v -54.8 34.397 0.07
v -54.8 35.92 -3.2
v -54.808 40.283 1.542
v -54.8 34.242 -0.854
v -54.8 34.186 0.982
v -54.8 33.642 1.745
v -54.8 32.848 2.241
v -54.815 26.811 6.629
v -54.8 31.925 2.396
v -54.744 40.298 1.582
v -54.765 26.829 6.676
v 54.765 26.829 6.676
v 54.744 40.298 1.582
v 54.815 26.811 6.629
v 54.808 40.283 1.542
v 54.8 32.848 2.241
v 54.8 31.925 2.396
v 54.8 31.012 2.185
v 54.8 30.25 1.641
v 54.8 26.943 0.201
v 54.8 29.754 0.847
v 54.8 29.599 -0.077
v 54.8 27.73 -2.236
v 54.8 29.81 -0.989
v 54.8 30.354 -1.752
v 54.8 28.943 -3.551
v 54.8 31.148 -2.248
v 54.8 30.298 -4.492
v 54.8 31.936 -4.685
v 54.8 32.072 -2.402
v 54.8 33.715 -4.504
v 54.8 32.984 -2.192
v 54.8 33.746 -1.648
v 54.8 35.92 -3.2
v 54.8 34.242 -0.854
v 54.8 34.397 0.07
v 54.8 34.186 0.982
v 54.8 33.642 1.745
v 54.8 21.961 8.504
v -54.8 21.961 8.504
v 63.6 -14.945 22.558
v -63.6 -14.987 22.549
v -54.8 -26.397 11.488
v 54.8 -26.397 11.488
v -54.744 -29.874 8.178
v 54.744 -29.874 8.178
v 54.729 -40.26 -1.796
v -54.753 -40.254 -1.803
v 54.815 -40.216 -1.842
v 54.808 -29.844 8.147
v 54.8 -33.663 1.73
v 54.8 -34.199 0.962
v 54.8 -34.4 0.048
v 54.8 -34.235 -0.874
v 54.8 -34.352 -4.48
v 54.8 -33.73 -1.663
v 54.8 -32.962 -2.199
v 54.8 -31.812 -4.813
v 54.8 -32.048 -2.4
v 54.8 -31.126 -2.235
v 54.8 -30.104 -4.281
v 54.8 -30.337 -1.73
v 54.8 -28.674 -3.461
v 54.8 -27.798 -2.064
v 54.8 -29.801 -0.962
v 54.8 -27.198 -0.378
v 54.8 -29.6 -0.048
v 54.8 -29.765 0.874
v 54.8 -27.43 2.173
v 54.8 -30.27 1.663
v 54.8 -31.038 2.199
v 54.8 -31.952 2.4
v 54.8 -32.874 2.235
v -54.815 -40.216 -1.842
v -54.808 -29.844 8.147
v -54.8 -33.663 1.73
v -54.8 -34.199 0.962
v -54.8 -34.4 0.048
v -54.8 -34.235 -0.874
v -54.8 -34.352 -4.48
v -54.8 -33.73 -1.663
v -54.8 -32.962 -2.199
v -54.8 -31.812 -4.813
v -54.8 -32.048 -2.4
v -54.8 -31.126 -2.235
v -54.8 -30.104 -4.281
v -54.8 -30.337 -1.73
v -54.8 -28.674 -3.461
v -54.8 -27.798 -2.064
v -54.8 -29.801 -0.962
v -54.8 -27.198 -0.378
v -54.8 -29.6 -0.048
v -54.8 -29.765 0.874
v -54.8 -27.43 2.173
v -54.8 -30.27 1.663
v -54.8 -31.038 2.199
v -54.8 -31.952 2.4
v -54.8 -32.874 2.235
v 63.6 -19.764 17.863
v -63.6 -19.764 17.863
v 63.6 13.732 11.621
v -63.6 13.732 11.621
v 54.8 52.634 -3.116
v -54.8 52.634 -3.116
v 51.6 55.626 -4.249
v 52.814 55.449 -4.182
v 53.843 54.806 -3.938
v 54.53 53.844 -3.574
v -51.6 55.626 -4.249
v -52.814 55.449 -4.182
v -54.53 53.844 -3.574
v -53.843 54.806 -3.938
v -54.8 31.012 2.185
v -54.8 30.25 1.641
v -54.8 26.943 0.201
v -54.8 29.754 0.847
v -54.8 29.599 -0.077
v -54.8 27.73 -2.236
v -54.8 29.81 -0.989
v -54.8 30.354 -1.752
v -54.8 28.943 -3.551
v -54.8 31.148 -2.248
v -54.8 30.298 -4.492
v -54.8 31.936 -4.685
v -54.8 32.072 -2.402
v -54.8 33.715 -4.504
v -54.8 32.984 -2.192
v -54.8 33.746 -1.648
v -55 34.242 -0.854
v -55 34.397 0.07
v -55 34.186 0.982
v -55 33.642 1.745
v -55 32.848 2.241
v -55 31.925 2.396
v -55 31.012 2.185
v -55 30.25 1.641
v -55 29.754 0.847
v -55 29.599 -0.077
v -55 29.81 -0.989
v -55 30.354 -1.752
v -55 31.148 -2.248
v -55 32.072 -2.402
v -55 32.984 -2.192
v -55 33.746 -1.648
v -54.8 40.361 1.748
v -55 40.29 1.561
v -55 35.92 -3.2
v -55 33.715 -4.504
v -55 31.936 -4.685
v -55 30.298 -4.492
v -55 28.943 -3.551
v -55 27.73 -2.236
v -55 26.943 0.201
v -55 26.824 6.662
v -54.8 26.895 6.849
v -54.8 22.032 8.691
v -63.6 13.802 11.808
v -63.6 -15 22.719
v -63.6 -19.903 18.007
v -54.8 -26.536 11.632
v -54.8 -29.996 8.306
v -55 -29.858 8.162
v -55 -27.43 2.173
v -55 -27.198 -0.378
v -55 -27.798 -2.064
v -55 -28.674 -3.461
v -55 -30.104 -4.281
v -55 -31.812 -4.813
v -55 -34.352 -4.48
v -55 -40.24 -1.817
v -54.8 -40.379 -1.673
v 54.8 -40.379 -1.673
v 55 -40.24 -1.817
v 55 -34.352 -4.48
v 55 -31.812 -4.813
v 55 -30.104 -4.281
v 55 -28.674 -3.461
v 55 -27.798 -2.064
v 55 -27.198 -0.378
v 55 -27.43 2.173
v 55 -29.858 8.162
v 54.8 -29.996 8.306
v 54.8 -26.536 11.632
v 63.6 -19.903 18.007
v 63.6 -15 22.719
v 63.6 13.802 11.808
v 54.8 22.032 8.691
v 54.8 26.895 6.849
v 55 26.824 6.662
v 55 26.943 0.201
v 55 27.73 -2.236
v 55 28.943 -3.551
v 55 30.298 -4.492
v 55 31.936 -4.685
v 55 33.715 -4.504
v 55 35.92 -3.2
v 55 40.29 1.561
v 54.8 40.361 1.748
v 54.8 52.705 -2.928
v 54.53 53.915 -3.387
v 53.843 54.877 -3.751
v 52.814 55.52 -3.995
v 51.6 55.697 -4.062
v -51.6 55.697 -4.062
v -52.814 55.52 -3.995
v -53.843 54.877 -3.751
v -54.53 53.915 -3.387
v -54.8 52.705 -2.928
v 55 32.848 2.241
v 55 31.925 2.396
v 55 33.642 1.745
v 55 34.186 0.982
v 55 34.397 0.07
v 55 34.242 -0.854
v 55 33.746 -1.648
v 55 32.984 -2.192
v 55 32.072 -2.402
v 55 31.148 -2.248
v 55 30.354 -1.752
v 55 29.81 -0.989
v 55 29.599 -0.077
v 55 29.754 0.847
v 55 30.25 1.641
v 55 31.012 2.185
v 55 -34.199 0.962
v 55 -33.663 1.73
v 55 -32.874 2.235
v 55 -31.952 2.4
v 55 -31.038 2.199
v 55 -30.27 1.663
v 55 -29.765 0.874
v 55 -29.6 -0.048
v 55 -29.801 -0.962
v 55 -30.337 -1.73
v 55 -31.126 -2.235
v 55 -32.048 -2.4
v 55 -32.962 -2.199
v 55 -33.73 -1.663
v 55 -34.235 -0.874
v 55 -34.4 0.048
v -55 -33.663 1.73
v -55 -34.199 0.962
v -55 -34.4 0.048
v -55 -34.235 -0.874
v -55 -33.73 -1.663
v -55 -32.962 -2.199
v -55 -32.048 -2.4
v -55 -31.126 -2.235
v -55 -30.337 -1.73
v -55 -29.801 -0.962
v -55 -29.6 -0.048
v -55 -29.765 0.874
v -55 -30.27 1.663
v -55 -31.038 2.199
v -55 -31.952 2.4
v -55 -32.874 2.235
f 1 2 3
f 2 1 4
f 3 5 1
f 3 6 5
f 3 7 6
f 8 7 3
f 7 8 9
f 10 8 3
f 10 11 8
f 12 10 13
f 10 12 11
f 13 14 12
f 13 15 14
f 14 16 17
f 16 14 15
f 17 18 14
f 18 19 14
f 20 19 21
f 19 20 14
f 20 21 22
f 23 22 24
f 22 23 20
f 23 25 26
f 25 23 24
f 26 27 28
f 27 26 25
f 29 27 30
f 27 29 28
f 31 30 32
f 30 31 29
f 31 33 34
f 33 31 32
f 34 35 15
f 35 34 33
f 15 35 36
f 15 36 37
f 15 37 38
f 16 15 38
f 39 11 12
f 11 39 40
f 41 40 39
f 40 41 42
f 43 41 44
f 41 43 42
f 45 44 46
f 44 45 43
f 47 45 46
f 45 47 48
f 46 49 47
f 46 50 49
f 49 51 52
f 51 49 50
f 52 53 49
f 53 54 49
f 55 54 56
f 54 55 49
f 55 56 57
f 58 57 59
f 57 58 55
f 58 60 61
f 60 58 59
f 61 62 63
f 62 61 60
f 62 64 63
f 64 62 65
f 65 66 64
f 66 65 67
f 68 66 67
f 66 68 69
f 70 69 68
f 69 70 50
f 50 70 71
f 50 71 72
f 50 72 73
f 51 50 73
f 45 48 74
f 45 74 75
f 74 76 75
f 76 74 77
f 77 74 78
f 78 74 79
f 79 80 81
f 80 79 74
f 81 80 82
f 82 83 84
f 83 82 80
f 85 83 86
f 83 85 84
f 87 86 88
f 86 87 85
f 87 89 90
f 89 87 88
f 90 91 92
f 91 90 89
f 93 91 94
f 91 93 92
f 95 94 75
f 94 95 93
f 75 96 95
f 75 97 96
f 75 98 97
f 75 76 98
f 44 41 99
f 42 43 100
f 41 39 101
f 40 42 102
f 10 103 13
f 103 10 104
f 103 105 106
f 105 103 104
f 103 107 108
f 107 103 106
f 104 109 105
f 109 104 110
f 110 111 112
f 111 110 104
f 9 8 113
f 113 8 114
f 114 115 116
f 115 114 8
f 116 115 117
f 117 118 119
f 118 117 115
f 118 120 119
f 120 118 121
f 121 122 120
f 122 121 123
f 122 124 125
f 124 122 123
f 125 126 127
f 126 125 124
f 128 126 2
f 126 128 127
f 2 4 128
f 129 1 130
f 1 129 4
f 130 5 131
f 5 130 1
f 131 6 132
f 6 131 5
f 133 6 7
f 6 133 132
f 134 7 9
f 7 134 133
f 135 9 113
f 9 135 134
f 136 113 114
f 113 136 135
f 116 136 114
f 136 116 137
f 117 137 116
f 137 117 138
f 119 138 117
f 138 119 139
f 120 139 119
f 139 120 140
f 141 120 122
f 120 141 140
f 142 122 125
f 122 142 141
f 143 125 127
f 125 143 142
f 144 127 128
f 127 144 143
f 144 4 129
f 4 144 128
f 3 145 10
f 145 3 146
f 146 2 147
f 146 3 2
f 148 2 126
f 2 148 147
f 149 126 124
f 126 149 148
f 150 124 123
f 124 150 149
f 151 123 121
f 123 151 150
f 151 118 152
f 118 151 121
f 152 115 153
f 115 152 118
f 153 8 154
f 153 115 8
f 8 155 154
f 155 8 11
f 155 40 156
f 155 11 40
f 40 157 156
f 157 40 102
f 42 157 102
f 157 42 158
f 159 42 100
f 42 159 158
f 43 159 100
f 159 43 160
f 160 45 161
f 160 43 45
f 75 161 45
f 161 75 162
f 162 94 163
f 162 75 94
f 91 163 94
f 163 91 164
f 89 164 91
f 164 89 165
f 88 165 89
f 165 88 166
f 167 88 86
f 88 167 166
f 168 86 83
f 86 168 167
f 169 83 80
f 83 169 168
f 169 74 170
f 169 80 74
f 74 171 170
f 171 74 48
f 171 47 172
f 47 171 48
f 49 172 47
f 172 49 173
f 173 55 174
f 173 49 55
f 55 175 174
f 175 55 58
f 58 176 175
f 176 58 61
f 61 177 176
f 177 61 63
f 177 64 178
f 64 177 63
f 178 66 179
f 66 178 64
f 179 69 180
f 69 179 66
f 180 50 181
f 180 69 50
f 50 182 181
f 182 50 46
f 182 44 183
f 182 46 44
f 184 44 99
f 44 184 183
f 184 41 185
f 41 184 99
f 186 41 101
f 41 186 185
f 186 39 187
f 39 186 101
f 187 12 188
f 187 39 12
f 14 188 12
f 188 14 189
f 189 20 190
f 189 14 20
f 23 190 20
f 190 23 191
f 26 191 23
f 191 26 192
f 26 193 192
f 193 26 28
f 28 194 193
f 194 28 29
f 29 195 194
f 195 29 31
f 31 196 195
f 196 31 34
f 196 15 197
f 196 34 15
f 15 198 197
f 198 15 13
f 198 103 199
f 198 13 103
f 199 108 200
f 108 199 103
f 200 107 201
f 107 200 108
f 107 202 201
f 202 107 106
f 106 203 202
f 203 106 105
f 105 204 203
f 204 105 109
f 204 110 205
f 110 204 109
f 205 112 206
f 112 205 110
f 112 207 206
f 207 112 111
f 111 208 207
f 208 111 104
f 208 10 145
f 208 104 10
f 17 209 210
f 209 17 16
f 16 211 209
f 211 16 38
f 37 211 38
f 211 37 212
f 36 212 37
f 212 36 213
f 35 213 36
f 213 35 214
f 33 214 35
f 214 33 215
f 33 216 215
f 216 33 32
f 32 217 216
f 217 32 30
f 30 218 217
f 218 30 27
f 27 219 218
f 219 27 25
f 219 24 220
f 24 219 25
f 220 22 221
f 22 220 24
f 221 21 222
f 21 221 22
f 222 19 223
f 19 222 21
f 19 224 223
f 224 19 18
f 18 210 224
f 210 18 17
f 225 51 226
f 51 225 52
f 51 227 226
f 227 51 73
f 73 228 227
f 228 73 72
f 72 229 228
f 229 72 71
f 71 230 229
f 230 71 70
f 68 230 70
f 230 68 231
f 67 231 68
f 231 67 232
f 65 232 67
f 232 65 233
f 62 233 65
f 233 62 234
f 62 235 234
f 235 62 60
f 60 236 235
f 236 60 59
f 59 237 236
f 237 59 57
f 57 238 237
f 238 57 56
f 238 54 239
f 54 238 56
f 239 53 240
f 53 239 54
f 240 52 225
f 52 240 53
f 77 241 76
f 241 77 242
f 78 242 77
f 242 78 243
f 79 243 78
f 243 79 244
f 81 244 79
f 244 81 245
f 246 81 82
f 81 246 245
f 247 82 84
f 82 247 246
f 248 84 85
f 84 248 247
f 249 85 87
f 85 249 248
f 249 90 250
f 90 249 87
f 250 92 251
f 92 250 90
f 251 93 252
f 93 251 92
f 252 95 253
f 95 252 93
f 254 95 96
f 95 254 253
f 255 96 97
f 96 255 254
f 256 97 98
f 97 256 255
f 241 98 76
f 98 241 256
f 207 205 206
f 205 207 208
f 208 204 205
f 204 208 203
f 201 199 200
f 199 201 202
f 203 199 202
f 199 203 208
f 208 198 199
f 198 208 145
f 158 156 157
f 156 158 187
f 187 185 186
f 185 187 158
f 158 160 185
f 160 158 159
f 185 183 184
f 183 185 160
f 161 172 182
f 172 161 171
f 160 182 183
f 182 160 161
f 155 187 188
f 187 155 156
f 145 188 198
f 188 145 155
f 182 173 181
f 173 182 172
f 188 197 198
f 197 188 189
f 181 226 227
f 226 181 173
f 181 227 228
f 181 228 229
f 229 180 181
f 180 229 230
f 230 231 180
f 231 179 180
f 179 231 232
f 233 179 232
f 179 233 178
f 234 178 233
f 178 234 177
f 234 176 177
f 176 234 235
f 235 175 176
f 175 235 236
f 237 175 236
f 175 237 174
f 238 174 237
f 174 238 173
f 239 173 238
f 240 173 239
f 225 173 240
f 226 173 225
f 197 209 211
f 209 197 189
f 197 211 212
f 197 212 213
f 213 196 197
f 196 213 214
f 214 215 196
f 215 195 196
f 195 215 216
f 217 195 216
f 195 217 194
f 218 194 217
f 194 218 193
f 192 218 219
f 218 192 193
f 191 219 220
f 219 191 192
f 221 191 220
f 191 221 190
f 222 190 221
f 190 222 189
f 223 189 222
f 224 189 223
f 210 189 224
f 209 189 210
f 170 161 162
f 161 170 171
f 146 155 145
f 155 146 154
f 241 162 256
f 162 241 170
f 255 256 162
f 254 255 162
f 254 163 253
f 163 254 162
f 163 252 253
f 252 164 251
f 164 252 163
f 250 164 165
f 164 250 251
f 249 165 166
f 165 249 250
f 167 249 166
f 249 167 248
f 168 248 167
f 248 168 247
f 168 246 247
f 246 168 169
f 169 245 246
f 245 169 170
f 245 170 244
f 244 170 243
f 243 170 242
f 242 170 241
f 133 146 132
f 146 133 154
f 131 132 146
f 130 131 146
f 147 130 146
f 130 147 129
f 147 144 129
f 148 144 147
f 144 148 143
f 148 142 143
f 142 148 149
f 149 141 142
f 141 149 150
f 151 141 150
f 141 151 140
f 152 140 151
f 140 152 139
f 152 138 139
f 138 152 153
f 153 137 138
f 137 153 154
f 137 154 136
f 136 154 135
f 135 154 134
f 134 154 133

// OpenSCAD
use <../lib.scad>
use <s/u9331c01s01.scad>
use <s/u9331c01s02.scad>
use <s/u9331c01s03.scad>
function ldraw_lib__u9331c01() = [
// 0 Cardboard Ramp 16 x 14 (Formed)
// 0 Name: u9331c01.dat
// 0 Author: Philippe Hurbain [Philo]
// 0 !LDRAW_ORG Part UPDATE 2019-01
// 0 !LICENSE Licensed under CC BY 2.0 and CC BY 4.0 : see CAreadme.txt
// 
// 0 BFC CERTIFY CCW
  [0,"BFC","CERTIFY"],
  [0,"BFC","CCW"],
// 
// 0 !CATEGORY Sheet Cardboard
// 
// 0 !HISTORY 2018-01-30 [PTadmin] Official Update 2018-01
// 0 !HISTORY 2019-01-25 [cwdee] Update category
// 0 !HISTORY 2019-06-28 [PTadmin] Official Update 2019-01
// 
// 
// 1 16 0 0 0 1 0 0 0 1 0 0 0 1 s\u9331c01s01.dat
  [1,16,0,0,0,1,0,0,0,1,0,0,0,1, ldraw_lib__s__u9331c01s01()],
// 1 16 0 0 0 1 0 0 0 1 0 0 0 1 s\u9331c01s02.dat
  [1,16,0,0,0,1,0,0,0,1,0,0,0,1, ldraw_lib__s__u9331c01s02()],
// 1 16 0 0 0 1 0 0 0 1 0 0 0 1 s\u9331c01s03.dat
  [1,16,0,0,0,1,0,0,0,1,0,0,0,1, ldraw_lib__s__u9331c01s03()],
// 1 16 0 0 0 -1 0 0 0 1 0 0 0 1 s\u9331c01s03.dat
  [1,16,0,0,0,-1,0,0,0,1,0,0,0,1, ldraw_lib__s__u9331c01s03()],
];
makepoly(ldraw_lib__u9331c01(), line=0.2);
